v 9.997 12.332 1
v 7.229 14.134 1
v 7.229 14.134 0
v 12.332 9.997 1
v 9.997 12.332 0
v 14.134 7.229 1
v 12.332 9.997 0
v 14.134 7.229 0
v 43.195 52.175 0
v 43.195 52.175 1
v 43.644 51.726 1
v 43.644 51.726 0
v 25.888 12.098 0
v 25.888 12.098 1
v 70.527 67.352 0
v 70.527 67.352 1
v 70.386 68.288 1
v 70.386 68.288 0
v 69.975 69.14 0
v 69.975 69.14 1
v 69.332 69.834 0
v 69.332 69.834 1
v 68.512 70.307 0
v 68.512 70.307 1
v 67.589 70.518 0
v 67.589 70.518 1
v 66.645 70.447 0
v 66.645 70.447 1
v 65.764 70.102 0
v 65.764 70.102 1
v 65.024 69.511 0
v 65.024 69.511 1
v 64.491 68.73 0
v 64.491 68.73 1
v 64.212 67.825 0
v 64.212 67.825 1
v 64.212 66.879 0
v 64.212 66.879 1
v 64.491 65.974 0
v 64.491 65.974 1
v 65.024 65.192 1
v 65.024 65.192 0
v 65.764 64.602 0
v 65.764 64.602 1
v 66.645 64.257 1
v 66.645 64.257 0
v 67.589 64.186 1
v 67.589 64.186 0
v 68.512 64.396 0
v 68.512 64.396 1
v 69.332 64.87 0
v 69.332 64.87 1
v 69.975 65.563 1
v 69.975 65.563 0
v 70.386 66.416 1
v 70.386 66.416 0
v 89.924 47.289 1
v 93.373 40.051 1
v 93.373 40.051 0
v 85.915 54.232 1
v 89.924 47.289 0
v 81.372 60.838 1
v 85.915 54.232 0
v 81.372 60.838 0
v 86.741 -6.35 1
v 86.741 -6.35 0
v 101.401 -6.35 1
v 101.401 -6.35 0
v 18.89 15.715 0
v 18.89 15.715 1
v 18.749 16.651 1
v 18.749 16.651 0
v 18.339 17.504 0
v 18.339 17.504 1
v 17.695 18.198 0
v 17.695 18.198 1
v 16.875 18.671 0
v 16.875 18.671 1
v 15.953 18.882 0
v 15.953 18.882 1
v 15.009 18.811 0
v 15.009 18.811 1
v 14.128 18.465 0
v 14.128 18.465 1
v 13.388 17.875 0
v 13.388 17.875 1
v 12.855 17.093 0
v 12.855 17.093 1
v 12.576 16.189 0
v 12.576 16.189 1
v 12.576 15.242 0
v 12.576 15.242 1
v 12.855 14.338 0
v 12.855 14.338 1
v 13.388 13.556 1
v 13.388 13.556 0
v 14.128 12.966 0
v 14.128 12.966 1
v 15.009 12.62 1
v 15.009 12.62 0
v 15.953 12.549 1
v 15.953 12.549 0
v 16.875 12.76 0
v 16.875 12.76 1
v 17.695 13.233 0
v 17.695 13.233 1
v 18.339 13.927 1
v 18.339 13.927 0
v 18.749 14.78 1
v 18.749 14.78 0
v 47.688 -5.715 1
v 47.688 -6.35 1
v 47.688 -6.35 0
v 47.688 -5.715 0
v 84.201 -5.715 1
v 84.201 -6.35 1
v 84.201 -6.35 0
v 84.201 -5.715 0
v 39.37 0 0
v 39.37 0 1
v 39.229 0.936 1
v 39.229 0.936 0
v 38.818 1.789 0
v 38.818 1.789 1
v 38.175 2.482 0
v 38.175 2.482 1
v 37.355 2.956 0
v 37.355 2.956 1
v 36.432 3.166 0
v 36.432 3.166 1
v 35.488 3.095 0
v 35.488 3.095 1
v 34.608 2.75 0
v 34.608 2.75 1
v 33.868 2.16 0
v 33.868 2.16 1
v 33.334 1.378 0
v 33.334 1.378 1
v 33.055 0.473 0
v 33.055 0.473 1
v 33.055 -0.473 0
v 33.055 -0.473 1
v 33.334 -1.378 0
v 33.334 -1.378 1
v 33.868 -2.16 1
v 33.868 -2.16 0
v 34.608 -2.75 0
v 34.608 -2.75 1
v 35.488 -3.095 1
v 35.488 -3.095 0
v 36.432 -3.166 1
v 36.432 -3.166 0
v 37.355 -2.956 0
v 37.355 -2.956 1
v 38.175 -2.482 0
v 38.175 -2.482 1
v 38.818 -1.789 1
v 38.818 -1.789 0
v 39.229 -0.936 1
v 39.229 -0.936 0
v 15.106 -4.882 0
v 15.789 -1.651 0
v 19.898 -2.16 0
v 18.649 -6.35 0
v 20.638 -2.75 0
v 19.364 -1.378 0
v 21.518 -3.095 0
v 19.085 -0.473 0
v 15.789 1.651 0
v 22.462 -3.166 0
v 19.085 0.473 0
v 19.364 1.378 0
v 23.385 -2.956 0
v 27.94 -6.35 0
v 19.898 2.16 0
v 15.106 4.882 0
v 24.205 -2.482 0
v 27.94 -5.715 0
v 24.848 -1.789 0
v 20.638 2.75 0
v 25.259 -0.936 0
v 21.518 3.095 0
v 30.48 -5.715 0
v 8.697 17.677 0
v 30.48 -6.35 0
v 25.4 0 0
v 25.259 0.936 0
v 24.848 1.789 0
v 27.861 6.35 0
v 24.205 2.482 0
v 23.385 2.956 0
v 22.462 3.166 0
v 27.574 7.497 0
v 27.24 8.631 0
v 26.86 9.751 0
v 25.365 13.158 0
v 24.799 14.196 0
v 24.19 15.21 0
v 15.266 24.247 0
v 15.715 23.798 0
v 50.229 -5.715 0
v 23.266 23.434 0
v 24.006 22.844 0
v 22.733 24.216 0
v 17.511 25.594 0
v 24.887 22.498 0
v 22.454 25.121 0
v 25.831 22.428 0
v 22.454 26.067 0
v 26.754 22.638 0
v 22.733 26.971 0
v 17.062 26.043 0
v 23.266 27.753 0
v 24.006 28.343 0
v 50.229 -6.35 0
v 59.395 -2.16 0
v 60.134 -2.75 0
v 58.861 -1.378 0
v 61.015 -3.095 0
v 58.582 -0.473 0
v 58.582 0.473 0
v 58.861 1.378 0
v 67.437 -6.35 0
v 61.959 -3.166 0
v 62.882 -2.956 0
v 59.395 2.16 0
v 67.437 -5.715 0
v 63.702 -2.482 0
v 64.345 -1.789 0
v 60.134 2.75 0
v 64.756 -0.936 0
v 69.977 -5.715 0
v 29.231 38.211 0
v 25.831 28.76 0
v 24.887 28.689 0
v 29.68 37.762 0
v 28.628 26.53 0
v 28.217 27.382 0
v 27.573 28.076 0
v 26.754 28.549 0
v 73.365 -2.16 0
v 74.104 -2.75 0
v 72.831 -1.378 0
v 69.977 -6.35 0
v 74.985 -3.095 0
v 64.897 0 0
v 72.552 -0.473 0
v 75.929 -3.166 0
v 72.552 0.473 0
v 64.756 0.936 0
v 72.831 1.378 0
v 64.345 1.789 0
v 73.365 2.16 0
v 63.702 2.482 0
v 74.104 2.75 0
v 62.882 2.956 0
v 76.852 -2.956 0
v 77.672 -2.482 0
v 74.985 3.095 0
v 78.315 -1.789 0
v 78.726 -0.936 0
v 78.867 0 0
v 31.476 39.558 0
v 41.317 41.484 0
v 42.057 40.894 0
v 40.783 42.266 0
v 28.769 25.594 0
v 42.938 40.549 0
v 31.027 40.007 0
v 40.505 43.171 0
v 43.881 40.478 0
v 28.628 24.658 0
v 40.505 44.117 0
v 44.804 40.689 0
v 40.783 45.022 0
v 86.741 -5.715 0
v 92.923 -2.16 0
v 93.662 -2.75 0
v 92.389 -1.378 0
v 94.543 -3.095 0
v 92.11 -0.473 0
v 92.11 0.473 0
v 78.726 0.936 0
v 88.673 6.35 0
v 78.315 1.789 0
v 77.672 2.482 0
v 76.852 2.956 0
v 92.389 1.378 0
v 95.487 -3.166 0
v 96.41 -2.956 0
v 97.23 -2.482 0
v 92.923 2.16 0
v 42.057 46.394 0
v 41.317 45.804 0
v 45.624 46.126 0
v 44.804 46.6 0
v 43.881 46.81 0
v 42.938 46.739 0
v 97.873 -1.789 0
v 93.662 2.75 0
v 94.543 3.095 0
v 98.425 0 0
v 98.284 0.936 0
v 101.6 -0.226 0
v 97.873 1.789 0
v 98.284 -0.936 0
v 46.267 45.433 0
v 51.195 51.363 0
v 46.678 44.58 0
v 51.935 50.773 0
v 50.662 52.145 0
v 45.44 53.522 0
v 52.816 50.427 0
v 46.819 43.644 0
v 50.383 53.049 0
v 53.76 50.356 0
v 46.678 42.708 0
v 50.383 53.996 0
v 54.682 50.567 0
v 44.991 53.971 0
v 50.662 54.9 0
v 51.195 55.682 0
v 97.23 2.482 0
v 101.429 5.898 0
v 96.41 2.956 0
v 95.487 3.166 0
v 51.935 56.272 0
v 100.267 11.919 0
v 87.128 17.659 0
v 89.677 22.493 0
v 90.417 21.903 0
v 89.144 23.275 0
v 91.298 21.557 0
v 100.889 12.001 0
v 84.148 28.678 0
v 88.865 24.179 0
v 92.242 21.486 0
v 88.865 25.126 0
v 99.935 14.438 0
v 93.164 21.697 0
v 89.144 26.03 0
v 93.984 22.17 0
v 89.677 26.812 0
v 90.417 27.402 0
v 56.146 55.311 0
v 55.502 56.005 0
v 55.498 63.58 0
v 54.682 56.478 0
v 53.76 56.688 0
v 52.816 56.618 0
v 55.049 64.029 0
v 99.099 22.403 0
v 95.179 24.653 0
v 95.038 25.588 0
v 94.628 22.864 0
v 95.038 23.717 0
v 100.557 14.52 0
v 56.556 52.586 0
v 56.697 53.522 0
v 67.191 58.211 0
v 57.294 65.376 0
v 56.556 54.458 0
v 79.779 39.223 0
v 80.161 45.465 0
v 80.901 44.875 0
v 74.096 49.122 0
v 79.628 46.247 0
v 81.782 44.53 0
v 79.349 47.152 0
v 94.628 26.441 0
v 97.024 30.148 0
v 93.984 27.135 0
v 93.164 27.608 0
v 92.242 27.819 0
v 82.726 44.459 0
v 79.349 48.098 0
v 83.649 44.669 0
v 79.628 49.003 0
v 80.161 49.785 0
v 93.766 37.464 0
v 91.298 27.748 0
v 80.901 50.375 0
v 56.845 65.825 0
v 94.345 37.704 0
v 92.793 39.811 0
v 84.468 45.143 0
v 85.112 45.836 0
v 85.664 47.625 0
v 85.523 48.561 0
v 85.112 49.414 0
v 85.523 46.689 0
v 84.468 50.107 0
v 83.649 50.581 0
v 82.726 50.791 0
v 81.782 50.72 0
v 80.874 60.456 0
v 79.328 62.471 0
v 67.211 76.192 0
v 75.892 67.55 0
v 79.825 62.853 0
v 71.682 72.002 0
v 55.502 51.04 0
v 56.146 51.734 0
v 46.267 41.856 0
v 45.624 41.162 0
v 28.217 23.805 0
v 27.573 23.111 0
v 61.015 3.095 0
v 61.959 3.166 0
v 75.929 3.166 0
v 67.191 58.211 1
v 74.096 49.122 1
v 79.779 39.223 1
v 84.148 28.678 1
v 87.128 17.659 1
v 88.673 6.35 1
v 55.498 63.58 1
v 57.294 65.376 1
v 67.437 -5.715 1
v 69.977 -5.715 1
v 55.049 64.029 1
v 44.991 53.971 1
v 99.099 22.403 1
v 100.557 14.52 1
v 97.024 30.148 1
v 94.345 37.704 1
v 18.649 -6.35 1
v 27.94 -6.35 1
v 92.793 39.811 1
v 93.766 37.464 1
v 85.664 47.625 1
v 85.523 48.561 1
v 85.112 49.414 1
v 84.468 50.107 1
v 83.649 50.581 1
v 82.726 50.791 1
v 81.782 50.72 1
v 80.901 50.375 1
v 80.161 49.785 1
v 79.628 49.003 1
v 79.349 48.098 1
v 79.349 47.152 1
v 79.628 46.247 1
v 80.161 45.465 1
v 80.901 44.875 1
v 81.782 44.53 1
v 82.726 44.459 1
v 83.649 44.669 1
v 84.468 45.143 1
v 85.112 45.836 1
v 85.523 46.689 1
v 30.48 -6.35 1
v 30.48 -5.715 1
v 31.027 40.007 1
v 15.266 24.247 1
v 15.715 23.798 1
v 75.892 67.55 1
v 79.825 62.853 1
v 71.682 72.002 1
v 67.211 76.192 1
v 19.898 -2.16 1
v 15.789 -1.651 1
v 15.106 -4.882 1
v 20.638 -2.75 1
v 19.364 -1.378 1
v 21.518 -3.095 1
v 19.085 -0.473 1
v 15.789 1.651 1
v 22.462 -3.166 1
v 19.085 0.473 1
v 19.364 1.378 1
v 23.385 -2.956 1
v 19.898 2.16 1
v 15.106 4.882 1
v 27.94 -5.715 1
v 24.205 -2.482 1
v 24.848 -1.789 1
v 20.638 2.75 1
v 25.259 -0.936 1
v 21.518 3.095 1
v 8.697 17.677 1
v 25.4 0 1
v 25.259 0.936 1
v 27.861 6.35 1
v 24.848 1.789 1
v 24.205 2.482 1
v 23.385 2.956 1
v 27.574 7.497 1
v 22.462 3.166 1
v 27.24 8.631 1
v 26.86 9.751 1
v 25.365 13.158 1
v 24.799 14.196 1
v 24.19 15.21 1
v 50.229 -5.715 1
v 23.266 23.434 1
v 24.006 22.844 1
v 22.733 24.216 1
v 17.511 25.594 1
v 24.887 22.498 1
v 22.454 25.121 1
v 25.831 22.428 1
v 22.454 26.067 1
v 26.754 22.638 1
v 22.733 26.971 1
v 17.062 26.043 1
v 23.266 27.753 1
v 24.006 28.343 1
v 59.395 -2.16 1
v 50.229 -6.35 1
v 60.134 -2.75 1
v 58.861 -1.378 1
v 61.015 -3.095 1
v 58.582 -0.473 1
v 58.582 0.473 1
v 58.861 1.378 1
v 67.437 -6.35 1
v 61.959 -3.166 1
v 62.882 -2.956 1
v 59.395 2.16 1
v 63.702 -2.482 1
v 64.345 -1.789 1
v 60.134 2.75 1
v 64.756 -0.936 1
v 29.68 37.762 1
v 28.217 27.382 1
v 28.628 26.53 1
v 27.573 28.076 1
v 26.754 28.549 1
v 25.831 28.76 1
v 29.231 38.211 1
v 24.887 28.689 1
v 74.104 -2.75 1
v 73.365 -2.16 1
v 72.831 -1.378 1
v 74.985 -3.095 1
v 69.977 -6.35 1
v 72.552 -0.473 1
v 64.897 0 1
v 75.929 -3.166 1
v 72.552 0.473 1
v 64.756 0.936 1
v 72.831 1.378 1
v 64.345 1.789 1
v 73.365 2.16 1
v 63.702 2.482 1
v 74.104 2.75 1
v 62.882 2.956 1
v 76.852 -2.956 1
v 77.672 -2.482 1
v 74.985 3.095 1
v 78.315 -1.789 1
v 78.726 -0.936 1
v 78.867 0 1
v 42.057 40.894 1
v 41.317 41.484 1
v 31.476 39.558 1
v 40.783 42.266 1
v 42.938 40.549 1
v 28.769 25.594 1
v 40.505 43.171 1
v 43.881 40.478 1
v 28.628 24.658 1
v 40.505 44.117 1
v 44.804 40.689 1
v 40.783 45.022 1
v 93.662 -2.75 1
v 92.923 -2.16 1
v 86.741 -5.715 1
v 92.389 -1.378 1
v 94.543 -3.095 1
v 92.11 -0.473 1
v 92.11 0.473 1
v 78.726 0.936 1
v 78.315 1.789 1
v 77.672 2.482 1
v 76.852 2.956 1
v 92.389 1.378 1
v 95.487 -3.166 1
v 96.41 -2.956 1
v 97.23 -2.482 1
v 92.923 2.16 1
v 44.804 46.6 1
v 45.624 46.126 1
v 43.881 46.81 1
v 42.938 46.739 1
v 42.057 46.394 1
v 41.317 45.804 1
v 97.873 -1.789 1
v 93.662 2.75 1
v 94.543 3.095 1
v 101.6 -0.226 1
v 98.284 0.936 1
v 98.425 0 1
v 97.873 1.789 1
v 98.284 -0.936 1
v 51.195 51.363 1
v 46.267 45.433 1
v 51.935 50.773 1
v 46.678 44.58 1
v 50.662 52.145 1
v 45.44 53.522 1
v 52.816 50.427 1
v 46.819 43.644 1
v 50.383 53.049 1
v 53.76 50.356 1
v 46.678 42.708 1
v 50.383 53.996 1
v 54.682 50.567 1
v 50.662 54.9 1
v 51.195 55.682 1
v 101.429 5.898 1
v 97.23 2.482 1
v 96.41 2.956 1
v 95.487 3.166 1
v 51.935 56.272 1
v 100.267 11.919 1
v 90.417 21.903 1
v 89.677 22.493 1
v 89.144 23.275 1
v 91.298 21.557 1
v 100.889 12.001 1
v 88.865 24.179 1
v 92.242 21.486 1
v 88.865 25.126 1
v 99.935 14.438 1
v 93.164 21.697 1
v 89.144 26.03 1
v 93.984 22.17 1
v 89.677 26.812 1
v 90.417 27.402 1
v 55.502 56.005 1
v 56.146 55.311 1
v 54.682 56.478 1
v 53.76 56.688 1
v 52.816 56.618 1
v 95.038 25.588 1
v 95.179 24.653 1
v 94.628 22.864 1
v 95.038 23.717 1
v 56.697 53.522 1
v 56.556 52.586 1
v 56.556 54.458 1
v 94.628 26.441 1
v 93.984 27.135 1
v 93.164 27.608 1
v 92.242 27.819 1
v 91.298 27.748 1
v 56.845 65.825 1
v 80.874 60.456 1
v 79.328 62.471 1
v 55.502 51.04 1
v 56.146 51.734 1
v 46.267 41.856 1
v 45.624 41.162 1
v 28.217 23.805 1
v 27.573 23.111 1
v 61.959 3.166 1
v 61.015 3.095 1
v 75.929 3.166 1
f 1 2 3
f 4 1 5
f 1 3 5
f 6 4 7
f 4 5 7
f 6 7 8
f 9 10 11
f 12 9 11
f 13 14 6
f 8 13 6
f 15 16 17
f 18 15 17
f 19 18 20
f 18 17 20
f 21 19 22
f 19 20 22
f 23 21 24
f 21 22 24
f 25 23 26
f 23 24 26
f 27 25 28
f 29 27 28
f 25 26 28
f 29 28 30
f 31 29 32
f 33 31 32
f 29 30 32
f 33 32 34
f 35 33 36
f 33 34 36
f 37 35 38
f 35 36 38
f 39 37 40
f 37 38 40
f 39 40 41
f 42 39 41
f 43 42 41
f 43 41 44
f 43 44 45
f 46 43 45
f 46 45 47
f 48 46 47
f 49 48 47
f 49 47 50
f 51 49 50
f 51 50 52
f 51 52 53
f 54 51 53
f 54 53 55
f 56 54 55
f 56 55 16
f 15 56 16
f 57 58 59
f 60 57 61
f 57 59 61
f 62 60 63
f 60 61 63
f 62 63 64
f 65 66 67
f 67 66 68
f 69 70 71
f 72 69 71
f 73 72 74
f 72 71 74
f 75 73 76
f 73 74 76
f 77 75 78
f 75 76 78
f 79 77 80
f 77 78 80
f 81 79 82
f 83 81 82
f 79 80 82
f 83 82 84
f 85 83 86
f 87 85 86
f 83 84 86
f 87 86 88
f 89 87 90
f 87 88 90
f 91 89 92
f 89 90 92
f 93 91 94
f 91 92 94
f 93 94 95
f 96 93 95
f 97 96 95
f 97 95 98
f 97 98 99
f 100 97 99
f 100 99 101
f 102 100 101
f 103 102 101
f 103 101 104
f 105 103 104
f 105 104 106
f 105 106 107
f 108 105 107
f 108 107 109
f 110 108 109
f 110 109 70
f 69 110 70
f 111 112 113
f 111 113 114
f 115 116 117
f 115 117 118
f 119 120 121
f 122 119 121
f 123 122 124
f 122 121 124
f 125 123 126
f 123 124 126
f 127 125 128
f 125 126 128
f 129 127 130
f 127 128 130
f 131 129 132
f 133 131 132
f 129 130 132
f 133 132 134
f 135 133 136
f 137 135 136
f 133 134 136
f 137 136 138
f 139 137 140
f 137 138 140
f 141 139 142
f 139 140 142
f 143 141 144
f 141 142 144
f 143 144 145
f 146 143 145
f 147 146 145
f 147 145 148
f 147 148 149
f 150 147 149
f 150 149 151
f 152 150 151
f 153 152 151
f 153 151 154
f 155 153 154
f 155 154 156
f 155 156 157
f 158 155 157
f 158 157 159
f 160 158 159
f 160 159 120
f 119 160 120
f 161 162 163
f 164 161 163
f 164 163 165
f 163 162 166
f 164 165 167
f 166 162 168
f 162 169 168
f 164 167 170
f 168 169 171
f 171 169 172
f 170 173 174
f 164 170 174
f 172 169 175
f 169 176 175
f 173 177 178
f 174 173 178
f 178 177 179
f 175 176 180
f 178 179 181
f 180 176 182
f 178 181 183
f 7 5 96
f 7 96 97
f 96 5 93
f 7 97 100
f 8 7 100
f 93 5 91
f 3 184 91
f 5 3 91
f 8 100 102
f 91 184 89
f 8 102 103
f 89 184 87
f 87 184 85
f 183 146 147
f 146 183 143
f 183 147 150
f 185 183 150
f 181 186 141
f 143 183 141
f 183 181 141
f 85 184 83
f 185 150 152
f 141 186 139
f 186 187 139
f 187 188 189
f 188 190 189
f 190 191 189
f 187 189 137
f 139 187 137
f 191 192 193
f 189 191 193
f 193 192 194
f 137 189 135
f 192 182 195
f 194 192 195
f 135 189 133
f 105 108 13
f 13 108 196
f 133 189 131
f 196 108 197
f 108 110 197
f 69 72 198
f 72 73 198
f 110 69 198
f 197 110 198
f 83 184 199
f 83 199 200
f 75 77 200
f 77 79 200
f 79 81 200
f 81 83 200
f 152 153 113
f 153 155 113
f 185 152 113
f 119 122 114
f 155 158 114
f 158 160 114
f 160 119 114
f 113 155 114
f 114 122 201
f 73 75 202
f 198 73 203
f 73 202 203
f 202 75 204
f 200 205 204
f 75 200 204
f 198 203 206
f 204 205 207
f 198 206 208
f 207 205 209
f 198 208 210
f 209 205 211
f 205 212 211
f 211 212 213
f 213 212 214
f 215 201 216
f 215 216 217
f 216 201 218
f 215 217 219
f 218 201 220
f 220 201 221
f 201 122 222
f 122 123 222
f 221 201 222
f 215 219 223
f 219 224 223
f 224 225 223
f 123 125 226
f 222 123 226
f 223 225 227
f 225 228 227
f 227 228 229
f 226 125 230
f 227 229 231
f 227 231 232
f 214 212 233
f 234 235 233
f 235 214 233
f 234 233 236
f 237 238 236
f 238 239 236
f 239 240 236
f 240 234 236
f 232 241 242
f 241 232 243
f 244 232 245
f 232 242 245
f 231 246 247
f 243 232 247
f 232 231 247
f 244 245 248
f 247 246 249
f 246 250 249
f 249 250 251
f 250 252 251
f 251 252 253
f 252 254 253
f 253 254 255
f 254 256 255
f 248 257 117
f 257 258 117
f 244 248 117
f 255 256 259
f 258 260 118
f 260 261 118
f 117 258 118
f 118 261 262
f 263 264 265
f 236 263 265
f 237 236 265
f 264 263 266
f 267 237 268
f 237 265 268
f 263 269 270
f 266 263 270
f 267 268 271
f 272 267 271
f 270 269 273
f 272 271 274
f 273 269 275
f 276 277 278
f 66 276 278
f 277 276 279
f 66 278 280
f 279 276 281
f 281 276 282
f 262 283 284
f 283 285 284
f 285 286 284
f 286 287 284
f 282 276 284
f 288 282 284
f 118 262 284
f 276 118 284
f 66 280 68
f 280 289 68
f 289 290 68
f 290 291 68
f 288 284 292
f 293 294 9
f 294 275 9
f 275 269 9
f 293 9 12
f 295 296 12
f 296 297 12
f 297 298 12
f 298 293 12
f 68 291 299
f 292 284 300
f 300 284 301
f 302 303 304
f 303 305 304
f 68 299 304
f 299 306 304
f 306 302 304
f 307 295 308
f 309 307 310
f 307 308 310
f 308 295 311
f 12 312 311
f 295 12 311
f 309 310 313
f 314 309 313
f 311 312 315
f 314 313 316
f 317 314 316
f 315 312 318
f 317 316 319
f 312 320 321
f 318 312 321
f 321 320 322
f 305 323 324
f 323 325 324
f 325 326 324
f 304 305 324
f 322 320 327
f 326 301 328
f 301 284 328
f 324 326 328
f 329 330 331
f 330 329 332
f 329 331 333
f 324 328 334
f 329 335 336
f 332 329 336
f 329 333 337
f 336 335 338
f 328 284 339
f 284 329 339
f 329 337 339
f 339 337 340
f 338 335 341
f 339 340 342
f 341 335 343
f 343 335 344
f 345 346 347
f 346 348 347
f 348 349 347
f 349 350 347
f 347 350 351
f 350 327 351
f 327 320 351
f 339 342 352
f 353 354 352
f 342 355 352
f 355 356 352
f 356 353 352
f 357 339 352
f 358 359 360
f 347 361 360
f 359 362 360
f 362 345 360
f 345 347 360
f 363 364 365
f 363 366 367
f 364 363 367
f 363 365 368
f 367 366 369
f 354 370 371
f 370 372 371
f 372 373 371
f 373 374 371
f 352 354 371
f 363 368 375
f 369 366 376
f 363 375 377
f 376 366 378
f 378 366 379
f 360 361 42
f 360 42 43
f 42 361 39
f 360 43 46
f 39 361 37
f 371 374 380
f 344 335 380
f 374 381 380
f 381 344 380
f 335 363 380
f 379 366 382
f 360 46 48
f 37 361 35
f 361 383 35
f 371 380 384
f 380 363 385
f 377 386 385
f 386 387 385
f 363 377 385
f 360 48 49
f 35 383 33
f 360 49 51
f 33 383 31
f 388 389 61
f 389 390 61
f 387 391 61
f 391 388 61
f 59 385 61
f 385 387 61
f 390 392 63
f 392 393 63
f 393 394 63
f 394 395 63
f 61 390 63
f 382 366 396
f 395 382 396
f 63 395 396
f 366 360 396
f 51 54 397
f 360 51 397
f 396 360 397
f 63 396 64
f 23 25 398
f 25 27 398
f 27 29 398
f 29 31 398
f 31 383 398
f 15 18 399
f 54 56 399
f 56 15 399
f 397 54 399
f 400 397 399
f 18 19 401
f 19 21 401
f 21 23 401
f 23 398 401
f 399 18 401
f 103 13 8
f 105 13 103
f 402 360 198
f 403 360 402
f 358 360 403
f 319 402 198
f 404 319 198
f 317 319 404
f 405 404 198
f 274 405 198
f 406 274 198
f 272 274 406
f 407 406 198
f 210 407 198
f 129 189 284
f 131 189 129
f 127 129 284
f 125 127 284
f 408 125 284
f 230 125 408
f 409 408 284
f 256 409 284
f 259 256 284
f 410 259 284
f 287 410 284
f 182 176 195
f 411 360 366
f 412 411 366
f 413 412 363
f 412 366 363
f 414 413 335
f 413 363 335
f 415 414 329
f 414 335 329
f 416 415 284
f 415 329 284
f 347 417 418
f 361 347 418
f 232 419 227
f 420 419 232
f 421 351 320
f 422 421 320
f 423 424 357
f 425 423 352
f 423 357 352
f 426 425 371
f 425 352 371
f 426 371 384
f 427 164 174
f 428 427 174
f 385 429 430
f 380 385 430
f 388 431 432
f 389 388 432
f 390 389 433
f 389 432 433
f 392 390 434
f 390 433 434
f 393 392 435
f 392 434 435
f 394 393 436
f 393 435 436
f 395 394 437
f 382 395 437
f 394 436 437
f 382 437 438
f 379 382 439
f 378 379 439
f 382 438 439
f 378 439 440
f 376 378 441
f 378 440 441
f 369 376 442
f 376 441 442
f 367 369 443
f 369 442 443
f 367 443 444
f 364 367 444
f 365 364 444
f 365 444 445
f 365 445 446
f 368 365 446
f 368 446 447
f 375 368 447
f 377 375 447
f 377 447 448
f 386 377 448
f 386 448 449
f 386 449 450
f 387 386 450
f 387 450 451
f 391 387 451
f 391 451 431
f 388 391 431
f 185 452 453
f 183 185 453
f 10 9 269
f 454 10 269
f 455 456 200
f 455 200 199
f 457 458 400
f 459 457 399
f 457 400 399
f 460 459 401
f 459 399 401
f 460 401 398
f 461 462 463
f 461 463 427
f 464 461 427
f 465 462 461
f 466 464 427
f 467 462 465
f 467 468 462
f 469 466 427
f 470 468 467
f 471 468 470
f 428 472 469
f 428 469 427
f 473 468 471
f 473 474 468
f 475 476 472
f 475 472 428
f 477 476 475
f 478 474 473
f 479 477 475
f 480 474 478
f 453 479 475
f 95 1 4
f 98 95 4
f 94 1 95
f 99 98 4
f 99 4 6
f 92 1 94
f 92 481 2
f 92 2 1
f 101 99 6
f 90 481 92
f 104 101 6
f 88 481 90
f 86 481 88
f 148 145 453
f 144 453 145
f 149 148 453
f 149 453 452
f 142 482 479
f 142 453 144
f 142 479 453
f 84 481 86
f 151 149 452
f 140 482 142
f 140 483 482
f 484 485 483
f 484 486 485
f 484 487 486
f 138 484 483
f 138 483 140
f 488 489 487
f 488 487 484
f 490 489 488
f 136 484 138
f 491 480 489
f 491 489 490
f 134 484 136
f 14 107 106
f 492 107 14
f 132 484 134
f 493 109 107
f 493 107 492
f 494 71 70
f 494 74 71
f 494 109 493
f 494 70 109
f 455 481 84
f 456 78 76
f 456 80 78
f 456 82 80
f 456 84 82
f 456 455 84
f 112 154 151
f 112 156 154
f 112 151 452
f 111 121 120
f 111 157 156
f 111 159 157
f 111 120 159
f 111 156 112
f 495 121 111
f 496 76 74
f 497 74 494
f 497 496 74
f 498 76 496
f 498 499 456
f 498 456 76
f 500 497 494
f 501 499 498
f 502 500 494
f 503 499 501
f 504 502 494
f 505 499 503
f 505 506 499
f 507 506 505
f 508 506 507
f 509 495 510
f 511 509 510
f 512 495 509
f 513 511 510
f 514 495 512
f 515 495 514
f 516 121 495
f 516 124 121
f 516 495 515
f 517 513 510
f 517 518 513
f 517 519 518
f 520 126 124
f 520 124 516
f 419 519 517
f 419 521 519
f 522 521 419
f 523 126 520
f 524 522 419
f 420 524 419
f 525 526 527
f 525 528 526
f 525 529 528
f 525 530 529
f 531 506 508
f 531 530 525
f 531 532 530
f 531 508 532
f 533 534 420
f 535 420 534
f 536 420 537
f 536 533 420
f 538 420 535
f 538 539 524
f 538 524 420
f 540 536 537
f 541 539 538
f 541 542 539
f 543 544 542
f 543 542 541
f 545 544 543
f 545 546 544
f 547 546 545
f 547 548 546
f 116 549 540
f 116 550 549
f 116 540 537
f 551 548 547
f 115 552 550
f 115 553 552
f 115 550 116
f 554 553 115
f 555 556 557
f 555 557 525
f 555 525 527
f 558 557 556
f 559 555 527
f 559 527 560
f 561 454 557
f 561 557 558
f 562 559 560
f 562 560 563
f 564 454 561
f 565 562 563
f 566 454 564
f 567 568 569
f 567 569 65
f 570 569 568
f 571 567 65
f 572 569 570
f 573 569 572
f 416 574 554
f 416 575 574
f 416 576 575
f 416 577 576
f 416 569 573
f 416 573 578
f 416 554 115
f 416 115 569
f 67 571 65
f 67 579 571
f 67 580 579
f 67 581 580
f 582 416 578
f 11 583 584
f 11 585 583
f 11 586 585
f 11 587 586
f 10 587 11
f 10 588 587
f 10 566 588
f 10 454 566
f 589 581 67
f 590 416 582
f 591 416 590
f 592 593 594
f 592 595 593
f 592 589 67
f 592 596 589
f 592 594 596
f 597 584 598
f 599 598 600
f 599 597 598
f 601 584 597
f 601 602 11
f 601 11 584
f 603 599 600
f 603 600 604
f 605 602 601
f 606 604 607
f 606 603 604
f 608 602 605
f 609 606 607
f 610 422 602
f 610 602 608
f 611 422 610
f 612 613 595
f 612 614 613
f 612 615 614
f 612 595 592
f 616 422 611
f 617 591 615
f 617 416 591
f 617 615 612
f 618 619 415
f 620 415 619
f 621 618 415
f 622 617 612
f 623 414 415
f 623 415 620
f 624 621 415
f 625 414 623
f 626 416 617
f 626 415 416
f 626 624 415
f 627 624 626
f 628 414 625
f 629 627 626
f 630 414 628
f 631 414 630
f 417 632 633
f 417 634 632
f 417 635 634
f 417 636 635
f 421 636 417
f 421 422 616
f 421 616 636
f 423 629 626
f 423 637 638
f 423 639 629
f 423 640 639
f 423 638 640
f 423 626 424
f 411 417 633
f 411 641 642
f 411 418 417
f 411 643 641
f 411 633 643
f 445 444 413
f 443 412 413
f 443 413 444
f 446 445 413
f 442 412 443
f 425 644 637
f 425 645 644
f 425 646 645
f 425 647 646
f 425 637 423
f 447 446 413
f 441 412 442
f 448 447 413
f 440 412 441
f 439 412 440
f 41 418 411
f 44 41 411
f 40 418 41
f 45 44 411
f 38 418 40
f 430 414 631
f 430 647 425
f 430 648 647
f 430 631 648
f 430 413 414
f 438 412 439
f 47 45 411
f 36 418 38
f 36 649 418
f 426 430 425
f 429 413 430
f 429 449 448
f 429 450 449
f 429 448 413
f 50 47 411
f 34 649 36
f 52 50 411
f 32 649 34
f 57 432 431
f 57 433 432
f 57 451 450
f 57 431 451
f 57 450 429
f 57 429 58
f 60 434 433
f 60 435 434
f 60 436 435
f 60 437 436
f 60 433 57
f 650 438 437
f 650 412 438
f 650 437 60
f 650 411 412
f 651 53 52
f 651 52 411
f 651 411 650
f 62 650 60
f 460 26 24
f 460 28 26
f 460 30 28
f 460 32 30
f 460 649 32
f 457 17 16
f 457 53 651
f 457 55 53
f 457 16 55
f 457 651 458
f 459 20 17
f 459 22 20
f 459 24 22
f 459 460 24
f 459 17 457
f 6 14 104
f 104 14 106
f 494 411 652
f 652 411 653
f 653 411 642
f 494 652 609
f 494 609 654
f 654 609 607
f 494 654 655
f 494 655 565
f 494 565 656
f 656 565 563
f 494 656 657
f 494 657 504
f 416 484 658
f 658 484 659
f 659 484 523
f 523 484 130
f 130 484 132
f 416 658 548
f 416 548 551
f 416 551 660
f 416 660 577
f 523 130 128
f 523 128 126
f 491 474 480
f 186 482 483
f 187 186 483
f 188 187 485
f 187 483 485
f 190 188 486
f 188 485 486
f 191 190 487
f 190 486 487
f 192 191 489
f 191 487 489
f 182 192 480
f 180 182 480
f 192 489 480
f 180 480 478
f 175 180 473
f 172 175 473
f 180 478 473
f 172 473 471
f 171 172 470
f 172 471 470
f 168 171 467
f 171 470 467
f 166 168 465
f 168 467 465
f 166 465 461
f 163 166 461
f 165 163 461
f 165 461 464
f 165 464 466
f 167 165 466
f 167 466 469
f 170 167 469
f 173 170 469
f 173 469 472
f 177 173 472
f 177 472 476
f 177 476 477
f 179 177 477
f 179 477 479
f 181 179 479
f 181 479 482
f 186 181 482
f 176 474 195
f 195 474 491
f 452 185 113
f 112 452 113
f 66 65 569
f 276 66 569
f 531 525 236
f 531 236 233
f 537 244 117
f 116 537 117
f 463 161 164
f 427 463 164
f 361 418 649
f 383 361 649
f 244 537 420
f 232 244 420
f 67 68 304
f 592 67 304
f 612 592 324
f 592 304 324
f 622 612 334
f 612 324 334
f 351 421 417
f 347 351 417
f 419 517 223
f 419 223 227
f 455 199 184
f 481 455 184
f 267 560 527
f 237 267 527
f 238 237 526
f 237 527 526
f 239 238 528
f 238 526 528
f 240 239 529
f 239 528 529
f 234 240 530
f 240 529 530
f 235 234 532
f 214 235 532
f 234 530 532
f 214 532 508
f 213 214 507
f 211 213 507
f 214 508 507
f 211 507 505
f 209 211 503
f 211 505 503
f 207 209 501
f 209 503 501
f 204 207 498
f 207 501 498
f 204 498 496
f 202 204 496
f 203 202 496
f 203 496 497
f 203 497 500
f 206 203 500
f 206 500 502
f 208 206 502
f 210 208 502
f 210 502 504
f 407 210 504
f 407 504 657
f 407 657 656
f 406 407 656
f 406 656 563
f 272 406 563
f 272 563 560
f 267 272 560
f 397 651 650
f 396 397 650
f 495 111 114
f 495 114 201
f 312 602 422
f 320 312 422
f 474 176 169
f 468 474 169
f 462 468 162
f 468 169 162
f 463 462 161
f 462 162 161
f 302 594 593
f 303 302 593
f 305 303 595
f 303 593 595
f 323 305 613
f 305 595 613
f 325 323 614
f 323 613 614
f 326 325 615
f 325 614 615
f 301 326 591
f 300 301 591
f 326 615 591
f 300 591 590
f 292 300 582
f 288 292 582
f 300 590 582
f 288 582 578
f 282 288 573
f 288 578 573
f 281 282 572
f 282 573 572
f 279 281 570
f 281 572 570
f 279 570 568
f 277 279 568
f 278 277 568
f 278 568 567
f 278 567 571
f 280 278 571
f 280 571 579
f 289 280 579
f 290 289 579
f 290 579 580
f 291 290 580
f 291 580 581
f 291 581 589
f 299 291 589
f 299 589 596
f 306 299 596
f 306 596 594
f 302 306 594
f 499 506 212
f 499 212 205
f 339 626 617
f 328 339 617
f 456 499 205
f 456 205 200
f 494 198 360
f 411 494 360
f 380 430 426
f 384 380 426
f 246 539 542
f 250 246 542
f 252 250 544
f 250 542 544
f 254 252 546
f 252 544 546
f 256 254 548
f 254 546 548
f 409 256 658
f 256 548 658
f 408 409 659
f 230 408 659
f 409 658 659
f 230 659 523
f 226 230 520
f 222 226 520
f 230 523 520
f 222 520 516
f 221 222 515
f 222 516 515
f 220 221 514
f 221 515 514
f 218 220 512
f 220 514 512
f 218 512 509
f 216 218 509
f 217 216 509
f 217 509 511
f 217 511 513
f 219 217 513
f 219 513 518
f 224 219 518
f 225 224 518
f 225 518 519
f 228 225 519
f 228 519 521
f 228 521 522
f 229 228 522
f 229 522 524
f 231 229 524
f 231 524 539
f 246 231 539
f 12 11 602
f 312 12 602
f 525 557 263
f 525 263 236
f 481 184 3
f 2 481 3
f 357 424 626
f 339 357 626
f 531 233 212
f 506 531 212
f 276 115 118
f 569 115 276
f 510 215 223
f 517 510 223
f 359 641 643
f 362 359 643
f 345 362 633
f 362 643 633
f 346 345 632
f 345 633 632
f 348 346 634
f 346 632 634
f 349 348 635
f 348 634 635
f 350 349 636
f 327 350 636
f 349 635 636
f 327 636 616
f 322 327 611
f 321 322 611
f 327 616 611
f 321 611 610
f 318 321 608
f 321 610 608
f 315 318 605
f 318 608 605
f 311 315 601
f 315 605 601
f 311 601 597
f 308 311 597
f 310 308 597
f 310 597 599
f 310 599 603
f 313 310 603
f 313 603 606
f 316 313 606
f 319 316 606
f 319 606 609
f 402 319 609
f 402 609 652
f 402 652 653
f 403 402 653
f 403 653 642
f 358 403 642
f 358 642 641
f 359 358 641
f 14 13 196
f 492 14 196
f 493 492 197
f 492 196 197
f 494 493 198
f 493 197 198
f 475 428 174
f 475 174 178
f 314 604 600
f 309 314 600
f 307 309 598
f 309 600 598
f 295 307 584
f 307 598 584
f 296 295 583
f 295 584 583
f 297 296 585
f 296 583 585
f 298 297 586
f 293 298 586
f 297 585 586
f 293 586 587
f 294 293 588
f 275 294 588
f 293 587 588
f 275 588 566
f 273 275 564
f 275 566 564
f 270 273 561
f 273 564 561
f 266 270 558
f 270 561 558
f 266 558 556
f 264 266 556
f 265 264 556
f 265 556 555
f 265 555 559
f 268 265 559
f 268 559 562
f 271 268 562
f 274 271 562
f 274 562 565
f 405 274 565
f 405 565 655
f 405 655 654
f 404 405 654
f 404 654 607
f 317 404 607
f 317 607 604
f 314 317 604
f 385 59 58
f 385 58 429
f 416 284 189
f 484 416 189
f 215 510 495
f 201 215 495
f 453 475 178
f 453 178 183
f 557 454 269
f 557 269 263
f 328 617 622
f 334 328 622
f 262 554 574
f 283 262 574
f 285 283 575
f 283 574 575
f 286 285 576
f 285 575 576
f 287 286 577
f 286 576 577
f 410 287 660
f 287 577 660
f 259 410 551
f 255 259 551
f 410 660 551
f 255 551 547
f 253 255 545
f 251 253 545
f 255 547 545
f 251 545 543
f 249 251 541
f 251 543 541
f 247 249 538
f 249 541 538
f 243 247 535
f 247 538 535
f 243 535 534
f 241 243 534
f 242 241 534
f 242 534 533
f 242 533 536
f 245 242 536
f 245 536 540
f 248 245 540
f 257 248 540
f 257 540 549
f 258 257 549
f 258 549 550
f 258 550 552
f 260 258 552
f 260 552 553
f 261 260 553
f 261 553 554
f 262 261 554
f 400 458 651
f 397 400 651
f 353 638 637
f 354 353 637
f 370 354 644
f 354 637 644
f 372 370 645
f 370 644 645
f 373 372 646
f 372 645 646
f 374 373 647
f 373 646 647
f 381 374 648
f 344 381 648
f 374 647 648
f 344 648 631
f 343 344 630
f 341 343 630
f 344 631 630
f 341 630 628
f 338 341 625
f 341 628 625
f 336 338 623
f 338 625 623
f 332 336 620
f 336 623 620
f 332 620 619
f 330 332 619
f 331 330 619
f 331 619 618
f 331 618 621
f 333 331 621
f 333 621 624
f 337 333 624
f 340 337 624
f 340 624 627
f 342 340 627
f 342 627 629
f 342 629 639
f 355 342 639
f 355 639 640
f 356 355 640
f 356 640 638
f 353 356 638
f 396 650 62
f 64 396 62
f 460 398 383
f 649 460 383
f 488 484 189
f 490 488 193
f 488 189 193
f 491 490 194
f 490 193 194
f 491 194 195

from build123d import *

# Parameters (mm, degrees)
BOSS_EXTRUDE1_DEPTH = 1
SKETCH2_R           = 3.175
CUT_EXTRUDE1_DEPTH  = 2
SKETCH3_W           = 2.54
SKETCH3_H           = 0.635
CUT_EXTRUDE2_DEPTH  = 2


with BuildPart() as part:
    # Sketch1 → Boss-Extrude1 (new body)
    with BuildSketch(Plane.XY):
        with BuildLine():
            Line((67.21146711, 76.191723231), (8.696654013, 17.676910134))
            Line((8.696654013, 17.676910134), (7.228954972, 14.133571205))
            ThreePointArc((7.228954972, 14.133571205), (14.666587579, 6.075099489), (15.105587123, -4.88230096))
            Line((15.105587123, -4.88230096), (18.648926052, -6.35))
            Line((18.648926052, -6.35), (101.401368334, -6.35))
            ThreePointArc((101.401368334, -6.35), (93.866160503, 38.880636728), (67.21146711, 76.191723231))
        make_face()
        with BuildLine():
            Line((88.672924278, 6.35), (27.86051193, 6.35))
            ThreePointArc((27.86051193, 6.35), (26.399857642, 10.93517908), (24.190484974, 15.210228852))
            Line((24.190484974, 15.210228852), (67.191354125, 58.211098004))
            ThreePointArc((67.191354125, 58.211098004), (82.13289044, 34.020557137), (88.672924278, 6.35))
        make_face(mode=Mode.SUBTRACT)
    extrude(amount=BOSS_EXTRUDE1_DEPTH)

    # Sketch2 → Cut-Extrude1 (cut, through all)
    with BuildSketch(Plane.XY.offset(1)):
        with Locations((22.225, 0)):
            Circle(SKETCH2_R)
        with Locations((36.195, 0)):
            Circle(SKETCH2_R)
        with Locations((61.722, 0)):
            Circle(SKETCH2_R)
        with Locations((75.692, 0)):
            Circle(SKETCH2_R)
        with Locations((95.25, 0)):
            Circle(SKETCH2_R)
        with Locations((15.715448212, 15.715448212)):
            Circle(SKETCH2_R)
        with Locations((25.593729945, 25.593729945)):
            Circle(SKETCH2_R)
        with Locations((43.644044748, 43.644044748)):
            Circle(SKETCH2_R)
        with Locations((53.522326482, 53.522326482)):
            Circle(SKETCH2_R)
        with Locations((92.004434954, 24.652514046)):
            Circle(SKETCH2_R)
        with Locations((82.48891971, 47.625)):
            Circle(SKETCH2_R)
        with Locations((67.351920908, 67.351920908)):
            Circle(SKETCH2_R)
    extrude(amount=-CUT_EXTRUDE1_DEPTH, mode=Mode.SUBTRACT)

    # Sketch3 → Cut-Extrude2 (cut, through all)
    with BuildSketch(Plane.XY.offset(1)):
        Polygon((15.266435406, 24.246691527), (17.06248663, 26.042742751), (17.511499436, 25.593729945), (15.715448212, 23.797678721), align=None)
        Polygon((44.991083167, 53.971339288), (43.195031942, 52.175288063), (43.644044748, 51.726275257), (45.440095973, 53.522326482), align=None)
        with Locations((29.21, -6.0325)):
            Rectangle(SKETCH3_W, SKETCH3_H)
        with Locations((68.707, -6.0325)):
            Rectangle(SKETCH3_W, SKETCH3_H)
        Polygon((29.230733674, 38.210989795), (31.026784898, 40.007041019), (31.475797704, 39.558028213), (29.67974648, 37.761976989), align=None)
        Polygon((56.845021246, 65.825277367), (55.048970022, 64.029226143), (55.497982828, 63.580213337), (57.294034052, 65.376264561), align=None)
        with Locations((48.9585, -6.0325)):
            Rectangle(SKETCH3_W, SKETCH3_H)
        with Locations((85.471, -6.0325)):
            Rectangle(SKETCH3_W, SKETCH3_H)
        Polygon((99.935462164, 14.437711971), (100.266998693, 11.919442024), (101.526133667, 12.085210288), (101.194597138, 14.603480236), align=None)
        Polygon((93.765504959, 37.464305742), (94.938831965, 37.950313702), (93.966816047, 40.296967714), (92.793489041, 39.810959755), align=None)
        Polygon((79.327792988, 62.471156422), (80.874047017, 60.456038938), (81.88160576, 61.229165953), (80.33535173, 63.244283437), align=None)
        Polygon((13.979268531, 4.415764523), (28.059192607, 10.247860033), (27.087176689, 12.594514045), (13.007252613, 6.762418536), align=None)
    extrude(amount=-CUT_EXTRUDE2_DEPTH, mode=Mode.SUBTRACT)


solid = part.part
